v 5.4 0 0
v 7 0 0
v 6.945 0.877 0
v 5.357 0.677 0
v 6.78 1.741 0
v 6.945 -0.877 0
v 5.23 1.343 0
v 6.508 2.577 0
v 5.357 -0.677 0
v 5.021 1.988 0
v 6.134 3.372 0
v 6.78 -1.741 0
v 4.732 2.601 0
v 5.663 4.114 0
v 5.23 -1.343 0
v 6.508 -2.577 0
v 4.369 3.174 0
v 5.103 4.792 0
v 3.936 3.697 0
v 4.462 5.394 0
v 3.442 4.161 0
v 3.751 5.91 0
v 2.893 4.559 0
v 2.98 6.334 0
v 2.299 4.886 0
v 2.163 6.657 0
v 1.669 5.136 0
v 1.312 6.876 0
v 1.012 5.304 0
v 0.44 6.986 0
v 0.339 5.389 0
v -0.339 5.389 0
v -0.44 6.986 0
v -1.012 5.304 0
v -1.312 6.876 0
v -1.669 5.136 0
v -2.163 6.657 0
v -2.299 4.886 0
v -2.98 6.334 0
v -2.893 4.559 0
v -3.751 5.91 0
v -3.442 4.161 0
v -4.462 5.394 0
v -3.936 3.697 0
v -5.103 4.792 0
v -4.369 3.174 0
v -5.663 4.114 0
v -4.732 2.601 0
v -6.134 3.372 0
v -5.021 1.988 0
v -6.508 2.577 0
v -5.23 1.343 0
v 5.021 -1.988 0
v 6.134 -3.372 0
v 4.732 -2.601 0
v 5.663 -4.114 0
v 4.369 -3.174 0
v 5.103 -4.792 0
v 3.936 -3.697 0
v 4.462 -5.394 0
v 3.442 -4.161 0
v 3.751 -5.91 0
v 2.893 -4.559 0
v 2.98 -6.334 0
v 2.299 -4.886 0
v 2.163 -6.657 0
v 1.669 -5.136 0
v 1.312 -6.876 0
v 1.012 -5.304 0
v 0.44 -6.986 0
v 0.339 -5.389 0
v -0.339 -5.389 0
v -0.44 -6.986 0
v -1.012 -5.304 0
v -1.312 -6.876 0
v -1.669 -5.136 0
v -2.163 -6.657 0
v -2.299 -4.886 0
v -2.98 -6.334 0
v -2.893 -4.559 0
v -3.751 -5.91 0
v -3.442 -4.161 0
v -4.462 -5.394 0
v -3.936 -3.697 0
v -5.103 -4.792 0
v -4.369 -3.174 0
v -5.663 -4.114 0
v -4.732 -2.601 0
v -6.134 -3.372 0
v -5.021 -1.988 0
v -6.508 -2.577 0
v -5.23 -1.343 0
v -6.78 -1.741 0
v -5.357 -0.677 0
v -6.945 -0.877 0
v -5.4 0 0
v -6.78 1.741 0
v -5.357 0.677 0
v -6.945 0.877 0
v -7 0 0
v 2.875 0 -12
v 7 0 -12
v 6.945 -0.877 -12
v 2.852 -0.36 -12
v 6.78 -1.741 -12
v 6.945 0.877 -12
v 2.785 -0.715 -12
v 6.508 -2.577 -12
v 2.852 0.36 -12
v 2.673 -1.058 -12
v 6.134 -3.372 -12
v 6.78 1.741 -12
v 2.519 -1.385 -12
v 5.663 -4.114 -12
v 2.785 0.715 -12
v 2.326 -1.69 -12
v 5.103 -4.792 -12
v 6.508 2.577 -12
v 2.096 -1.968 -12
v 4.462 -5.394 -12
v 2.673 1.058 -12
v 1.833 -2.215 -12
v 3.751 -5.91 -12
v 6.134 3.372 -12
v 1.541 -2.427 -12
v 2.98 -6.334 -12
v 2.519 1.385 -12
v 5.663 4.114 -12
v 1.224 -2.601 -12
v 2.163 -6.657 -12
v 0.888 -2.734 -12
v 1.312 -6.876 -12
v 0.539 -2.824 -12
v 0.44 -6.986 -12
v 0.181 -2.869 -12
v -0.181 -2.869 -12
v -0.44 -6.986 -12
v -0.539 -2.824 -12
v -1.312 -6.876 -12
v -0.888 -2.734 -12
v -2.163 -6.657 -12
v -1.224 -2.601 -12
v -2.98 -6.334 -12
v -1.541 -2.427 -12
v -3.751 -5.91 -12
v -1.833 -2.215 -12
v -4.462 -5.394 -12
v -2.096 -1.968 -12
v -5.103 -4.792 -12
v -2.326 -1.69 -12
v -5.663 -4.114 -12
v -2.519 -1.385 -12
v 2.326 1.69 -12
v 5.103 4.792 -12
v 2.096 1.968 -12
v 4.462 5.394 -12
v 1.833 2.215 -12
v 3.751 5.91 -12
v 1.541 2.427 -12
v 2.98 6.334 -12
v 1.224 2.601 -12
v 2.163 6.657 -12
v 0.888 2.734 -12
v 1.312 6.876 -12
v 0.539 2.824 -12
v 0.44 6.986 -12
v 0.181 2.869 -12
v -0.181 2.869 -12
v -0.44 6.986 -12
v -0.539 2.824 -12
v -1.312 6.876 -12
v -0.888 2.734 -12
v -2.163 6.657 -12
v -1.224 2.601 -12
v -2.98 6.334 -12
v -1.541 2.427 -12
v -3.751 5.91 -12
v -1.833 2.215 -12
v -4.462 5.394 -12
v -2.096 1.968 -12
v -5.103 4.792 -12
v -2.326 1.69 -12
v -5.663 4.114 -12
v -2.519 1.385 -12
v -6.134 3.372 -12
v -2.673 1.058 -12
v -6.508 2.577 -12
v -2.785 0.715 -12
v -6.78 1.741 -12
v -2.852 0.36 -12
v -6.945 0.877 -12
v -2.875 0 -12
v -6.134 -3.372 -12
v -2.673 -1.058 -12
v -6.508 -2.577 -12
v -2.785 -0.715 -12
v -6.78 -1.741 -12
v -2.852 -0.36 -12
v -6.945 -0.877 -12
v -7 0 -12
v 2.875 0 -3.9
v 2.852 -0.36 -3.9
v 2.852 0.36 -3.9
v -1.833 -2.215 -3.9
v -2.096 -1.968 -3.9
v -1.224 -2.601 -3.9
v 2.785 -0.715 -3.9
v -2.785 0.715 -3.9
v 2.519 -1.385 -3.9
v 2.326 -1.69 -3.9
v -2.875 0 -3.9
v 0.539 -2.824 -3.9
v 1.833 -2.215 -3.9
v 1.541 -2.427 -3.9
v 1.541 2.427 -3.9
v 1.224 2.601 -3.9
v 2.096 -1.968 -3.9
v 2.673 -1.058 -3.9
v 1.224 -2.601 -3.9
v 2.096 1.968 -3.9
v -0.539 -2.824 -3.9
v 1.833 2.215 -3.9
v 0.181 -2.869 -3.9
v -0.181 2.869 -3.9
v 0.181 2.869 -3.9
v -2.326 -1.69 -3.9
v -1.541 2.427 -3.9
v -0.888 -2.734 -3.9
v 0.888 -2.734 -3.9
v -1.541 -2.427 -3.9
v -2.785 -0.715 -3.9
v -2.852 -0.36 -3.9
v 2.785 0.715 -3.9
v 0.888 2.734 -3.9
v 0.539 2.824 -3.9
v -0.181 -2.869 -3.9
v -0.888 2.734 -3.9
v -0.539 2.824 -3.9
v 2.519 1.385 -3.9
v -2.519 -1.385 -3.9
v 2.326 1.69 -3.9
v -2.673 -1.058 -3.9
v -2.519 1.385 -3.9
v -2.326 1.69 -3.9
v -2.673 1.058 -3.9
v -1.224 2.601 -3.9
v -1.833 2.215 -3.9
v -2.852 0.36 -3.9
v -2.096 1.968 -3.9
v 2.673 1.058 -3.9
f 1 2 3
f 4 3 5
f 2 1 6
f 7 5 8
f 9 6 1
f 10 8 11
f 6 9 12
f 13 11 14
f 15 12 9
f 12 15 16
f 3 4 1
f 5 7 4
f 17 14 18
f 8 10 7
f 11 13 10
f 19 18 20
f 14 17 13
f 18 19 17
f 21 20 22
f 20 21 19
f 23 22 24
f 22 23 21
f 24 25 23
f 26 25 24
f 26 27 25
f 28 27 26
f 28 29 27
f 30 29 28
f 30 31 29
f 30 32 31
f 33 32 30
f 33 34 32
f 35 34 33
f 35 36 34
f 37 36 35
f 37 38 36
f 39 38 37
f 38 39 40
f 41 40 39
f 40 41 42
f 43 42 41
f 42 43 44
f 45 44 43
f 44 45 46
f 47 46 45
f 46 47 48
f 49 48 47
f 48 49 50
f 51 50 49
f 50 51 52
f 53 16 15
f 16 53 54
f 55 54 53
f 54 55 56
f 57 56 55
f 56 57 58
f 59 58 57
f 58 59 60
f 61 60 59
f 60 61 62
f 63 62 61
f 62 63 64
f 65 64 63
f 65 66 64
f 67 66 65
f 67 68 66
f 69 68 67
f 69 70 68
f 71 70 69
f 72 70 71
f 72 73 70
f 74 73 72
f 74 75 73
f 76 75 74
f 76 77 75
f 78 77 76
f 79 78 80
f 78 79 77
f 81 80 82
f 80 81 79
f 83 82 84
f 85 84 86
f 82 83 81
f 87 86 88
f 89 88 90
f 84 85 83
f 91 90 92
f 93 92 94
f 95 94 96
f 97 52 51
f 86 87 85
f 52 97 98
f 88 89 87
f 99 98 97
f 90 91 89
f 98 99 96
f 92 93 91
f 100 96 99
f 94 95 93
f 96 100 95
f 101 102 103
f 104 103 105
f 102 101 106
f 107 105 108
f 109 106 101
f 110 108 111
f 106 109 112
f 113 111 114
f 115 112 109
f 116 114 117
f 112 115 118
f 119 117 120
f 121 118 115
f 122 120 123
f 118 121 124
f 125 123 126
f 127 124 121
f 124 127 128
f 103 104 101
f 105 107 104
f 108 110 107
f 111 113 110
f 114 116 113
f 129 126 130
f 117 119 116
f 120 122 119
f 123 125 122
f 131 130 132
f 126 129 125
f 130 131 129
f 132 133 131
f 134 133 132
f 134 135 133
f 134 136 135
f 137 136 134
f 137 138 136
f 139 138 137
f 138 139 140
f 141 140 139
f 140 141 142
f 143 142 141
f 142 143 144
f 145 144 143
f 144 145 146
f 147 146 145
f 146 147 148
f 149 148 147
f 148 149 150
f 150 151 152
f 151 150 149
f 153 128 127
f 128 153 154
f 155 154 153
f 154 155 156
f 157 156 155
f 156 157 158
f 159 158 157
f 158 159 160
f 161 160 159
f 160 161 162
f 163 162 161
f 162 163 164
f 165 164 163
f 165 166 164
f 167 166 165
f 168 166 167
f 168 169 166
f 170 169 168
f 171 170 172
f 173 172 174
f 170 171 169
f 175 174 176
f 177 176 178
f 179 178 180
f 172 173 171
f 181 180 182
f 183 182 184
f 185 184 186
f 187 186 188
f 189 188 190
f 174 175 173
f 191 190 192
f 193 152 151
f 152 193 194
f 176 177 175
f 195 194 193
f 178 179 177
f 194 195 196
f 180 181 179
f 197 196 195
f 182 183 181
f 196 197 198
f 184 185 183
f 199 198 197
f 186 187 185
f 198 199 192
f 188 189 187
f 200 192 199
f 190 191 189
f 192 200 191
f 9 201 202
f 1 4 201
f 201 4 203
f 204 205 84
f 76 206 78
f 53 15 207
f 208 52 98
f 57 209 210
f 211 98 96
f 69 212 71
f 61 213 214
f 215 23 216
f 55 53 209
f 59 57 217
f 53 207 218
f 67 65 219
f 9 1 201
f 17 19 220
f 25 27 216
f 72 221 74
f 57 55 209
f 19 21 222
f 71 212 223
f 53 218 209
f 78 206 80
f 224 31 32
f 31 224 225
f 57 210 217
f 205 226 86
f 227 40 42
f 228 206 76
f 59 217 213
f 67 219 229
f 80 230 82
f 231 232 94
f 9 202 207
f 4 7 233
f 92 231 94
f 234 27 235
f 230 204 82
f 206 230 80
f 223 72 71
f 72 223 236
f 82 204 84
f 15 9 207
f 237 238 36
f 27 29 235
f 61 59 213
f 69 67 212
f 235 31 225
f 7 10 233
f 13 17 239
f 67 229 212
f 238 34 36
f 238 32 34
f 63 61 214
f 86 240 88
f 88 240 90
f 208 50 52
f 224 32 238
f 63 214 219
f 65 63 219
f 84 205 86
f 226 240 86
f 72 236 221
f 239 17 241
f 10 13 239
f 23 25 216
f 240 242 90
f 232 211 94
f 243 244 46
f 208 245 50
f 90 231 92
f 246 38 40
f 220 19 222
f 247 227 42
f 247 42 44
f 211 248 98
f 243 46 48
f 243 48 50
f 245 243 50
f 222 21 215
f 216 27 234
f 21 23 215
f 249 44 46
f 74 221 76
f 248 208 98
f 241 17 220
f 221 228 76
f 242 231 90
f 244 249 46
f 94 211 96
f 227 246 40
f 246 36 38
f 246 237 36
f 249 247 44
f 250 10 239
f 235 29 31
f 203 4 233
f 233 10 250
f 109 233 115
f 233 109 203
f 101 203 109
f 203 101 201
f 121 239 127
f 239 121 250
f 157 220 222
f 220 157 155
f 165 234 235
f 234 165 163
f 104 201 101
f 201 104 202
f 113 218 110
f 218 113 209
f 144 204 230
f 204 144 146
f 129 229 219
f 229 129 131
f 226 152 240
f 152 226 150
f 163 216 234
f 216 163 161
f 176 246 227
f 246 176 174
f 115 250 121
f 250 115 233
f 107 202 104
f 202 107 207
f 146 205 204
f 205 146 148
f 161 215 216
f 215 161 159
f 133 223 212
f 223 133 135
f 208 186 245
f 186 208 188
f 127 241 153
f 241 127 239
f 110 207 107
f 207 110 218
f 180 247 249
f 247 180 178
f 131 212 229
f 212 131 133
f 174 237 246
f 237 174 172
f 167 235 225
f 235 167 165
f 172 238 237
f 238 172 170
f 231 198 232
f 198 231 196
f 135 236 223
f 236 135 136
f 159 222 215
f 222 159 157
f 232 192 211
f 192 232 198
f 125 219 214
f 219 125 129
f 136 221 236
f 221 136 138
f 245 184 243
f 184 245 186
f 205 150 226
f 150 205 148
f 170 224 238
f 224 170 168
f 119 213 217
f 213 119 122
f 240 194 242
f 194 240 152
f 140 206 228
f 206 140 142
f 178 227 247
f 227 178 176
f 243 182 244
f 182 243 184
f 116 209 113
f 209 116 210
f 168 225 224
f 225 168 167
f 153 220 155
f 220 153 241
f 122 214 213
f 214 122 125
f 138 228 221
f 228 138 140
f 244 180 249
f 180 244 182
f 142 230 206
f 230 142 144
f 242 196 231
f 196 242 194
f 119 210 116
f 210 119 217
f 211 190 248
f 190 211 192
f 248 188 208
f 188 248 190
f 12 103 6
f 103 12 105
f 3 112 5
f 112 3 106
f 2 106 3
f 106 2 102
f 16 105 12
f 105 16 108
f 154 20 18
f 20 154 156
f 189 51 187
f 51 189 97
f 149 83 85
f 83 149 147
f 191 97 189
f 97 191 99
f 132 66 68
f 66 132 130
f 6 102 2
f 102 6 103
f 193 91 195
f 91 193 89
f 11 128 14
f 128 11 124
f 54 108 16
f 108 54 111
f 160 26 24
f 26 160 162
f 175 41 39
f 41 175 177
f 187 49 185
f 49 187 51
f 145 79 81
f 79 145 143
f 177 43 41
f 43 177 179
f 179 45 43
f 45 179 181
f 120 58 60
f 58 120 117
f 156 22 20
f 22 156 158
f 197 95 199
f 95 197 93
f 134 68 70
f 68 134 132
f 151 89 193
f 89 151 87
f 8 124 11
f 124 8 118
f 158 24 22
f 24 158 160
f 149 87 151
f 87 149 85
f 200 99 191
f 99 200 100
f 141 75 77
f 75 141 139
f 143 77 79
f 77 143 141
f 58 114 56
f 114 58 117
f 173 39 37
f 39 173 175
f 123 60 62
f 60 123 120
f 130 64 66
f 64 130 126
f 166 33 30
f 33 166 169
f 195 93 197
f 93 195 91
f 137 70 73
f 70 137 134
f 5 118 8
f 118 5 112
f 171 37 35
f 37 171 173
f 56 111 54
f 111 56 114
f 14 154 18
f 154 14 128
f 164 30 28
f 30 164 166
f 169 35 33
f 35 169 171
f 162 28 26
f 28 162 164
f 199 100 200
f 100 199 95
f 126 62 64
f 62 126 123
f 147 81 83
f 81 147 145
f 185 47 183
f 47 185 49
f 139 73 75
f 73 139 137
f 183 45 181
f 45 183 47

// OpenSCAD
$fn = 50;


difference() {
	union() {
		translate(v = [0, 0, -12.0000000000]) {
			cylinder(h = 12, r = 7.0000000000);
		}
		cylinder(h = 0, r = 16.0000000000);
	}
	union() {
		translate(v = [0, 0, 0]) {
			rotate(a = [0, 0, 0]) {
				difference() {
					union() {
						#translate(v = [0, 0, -12.0000000000]) {
							cylinder(h = 12, r = 2.6000000000);
						}
						#translate(v = [0, 0, -3.9000000000]) {
							cylinder(h = 3.9000000000, r1 = 2.8750000000, r2 = 5.4000000000);
						}
						#translate(v = [0, 0, -12.0000000000]) {
							cylinder(h = 12, r = 2.8750000000);
						}
						#translate(v = [0, 0, -12.0000000000]) {
							cylinder(h = 12, r = 2.6000000000);
						}
					}
					union();
				}
			}
		}
	}
}
